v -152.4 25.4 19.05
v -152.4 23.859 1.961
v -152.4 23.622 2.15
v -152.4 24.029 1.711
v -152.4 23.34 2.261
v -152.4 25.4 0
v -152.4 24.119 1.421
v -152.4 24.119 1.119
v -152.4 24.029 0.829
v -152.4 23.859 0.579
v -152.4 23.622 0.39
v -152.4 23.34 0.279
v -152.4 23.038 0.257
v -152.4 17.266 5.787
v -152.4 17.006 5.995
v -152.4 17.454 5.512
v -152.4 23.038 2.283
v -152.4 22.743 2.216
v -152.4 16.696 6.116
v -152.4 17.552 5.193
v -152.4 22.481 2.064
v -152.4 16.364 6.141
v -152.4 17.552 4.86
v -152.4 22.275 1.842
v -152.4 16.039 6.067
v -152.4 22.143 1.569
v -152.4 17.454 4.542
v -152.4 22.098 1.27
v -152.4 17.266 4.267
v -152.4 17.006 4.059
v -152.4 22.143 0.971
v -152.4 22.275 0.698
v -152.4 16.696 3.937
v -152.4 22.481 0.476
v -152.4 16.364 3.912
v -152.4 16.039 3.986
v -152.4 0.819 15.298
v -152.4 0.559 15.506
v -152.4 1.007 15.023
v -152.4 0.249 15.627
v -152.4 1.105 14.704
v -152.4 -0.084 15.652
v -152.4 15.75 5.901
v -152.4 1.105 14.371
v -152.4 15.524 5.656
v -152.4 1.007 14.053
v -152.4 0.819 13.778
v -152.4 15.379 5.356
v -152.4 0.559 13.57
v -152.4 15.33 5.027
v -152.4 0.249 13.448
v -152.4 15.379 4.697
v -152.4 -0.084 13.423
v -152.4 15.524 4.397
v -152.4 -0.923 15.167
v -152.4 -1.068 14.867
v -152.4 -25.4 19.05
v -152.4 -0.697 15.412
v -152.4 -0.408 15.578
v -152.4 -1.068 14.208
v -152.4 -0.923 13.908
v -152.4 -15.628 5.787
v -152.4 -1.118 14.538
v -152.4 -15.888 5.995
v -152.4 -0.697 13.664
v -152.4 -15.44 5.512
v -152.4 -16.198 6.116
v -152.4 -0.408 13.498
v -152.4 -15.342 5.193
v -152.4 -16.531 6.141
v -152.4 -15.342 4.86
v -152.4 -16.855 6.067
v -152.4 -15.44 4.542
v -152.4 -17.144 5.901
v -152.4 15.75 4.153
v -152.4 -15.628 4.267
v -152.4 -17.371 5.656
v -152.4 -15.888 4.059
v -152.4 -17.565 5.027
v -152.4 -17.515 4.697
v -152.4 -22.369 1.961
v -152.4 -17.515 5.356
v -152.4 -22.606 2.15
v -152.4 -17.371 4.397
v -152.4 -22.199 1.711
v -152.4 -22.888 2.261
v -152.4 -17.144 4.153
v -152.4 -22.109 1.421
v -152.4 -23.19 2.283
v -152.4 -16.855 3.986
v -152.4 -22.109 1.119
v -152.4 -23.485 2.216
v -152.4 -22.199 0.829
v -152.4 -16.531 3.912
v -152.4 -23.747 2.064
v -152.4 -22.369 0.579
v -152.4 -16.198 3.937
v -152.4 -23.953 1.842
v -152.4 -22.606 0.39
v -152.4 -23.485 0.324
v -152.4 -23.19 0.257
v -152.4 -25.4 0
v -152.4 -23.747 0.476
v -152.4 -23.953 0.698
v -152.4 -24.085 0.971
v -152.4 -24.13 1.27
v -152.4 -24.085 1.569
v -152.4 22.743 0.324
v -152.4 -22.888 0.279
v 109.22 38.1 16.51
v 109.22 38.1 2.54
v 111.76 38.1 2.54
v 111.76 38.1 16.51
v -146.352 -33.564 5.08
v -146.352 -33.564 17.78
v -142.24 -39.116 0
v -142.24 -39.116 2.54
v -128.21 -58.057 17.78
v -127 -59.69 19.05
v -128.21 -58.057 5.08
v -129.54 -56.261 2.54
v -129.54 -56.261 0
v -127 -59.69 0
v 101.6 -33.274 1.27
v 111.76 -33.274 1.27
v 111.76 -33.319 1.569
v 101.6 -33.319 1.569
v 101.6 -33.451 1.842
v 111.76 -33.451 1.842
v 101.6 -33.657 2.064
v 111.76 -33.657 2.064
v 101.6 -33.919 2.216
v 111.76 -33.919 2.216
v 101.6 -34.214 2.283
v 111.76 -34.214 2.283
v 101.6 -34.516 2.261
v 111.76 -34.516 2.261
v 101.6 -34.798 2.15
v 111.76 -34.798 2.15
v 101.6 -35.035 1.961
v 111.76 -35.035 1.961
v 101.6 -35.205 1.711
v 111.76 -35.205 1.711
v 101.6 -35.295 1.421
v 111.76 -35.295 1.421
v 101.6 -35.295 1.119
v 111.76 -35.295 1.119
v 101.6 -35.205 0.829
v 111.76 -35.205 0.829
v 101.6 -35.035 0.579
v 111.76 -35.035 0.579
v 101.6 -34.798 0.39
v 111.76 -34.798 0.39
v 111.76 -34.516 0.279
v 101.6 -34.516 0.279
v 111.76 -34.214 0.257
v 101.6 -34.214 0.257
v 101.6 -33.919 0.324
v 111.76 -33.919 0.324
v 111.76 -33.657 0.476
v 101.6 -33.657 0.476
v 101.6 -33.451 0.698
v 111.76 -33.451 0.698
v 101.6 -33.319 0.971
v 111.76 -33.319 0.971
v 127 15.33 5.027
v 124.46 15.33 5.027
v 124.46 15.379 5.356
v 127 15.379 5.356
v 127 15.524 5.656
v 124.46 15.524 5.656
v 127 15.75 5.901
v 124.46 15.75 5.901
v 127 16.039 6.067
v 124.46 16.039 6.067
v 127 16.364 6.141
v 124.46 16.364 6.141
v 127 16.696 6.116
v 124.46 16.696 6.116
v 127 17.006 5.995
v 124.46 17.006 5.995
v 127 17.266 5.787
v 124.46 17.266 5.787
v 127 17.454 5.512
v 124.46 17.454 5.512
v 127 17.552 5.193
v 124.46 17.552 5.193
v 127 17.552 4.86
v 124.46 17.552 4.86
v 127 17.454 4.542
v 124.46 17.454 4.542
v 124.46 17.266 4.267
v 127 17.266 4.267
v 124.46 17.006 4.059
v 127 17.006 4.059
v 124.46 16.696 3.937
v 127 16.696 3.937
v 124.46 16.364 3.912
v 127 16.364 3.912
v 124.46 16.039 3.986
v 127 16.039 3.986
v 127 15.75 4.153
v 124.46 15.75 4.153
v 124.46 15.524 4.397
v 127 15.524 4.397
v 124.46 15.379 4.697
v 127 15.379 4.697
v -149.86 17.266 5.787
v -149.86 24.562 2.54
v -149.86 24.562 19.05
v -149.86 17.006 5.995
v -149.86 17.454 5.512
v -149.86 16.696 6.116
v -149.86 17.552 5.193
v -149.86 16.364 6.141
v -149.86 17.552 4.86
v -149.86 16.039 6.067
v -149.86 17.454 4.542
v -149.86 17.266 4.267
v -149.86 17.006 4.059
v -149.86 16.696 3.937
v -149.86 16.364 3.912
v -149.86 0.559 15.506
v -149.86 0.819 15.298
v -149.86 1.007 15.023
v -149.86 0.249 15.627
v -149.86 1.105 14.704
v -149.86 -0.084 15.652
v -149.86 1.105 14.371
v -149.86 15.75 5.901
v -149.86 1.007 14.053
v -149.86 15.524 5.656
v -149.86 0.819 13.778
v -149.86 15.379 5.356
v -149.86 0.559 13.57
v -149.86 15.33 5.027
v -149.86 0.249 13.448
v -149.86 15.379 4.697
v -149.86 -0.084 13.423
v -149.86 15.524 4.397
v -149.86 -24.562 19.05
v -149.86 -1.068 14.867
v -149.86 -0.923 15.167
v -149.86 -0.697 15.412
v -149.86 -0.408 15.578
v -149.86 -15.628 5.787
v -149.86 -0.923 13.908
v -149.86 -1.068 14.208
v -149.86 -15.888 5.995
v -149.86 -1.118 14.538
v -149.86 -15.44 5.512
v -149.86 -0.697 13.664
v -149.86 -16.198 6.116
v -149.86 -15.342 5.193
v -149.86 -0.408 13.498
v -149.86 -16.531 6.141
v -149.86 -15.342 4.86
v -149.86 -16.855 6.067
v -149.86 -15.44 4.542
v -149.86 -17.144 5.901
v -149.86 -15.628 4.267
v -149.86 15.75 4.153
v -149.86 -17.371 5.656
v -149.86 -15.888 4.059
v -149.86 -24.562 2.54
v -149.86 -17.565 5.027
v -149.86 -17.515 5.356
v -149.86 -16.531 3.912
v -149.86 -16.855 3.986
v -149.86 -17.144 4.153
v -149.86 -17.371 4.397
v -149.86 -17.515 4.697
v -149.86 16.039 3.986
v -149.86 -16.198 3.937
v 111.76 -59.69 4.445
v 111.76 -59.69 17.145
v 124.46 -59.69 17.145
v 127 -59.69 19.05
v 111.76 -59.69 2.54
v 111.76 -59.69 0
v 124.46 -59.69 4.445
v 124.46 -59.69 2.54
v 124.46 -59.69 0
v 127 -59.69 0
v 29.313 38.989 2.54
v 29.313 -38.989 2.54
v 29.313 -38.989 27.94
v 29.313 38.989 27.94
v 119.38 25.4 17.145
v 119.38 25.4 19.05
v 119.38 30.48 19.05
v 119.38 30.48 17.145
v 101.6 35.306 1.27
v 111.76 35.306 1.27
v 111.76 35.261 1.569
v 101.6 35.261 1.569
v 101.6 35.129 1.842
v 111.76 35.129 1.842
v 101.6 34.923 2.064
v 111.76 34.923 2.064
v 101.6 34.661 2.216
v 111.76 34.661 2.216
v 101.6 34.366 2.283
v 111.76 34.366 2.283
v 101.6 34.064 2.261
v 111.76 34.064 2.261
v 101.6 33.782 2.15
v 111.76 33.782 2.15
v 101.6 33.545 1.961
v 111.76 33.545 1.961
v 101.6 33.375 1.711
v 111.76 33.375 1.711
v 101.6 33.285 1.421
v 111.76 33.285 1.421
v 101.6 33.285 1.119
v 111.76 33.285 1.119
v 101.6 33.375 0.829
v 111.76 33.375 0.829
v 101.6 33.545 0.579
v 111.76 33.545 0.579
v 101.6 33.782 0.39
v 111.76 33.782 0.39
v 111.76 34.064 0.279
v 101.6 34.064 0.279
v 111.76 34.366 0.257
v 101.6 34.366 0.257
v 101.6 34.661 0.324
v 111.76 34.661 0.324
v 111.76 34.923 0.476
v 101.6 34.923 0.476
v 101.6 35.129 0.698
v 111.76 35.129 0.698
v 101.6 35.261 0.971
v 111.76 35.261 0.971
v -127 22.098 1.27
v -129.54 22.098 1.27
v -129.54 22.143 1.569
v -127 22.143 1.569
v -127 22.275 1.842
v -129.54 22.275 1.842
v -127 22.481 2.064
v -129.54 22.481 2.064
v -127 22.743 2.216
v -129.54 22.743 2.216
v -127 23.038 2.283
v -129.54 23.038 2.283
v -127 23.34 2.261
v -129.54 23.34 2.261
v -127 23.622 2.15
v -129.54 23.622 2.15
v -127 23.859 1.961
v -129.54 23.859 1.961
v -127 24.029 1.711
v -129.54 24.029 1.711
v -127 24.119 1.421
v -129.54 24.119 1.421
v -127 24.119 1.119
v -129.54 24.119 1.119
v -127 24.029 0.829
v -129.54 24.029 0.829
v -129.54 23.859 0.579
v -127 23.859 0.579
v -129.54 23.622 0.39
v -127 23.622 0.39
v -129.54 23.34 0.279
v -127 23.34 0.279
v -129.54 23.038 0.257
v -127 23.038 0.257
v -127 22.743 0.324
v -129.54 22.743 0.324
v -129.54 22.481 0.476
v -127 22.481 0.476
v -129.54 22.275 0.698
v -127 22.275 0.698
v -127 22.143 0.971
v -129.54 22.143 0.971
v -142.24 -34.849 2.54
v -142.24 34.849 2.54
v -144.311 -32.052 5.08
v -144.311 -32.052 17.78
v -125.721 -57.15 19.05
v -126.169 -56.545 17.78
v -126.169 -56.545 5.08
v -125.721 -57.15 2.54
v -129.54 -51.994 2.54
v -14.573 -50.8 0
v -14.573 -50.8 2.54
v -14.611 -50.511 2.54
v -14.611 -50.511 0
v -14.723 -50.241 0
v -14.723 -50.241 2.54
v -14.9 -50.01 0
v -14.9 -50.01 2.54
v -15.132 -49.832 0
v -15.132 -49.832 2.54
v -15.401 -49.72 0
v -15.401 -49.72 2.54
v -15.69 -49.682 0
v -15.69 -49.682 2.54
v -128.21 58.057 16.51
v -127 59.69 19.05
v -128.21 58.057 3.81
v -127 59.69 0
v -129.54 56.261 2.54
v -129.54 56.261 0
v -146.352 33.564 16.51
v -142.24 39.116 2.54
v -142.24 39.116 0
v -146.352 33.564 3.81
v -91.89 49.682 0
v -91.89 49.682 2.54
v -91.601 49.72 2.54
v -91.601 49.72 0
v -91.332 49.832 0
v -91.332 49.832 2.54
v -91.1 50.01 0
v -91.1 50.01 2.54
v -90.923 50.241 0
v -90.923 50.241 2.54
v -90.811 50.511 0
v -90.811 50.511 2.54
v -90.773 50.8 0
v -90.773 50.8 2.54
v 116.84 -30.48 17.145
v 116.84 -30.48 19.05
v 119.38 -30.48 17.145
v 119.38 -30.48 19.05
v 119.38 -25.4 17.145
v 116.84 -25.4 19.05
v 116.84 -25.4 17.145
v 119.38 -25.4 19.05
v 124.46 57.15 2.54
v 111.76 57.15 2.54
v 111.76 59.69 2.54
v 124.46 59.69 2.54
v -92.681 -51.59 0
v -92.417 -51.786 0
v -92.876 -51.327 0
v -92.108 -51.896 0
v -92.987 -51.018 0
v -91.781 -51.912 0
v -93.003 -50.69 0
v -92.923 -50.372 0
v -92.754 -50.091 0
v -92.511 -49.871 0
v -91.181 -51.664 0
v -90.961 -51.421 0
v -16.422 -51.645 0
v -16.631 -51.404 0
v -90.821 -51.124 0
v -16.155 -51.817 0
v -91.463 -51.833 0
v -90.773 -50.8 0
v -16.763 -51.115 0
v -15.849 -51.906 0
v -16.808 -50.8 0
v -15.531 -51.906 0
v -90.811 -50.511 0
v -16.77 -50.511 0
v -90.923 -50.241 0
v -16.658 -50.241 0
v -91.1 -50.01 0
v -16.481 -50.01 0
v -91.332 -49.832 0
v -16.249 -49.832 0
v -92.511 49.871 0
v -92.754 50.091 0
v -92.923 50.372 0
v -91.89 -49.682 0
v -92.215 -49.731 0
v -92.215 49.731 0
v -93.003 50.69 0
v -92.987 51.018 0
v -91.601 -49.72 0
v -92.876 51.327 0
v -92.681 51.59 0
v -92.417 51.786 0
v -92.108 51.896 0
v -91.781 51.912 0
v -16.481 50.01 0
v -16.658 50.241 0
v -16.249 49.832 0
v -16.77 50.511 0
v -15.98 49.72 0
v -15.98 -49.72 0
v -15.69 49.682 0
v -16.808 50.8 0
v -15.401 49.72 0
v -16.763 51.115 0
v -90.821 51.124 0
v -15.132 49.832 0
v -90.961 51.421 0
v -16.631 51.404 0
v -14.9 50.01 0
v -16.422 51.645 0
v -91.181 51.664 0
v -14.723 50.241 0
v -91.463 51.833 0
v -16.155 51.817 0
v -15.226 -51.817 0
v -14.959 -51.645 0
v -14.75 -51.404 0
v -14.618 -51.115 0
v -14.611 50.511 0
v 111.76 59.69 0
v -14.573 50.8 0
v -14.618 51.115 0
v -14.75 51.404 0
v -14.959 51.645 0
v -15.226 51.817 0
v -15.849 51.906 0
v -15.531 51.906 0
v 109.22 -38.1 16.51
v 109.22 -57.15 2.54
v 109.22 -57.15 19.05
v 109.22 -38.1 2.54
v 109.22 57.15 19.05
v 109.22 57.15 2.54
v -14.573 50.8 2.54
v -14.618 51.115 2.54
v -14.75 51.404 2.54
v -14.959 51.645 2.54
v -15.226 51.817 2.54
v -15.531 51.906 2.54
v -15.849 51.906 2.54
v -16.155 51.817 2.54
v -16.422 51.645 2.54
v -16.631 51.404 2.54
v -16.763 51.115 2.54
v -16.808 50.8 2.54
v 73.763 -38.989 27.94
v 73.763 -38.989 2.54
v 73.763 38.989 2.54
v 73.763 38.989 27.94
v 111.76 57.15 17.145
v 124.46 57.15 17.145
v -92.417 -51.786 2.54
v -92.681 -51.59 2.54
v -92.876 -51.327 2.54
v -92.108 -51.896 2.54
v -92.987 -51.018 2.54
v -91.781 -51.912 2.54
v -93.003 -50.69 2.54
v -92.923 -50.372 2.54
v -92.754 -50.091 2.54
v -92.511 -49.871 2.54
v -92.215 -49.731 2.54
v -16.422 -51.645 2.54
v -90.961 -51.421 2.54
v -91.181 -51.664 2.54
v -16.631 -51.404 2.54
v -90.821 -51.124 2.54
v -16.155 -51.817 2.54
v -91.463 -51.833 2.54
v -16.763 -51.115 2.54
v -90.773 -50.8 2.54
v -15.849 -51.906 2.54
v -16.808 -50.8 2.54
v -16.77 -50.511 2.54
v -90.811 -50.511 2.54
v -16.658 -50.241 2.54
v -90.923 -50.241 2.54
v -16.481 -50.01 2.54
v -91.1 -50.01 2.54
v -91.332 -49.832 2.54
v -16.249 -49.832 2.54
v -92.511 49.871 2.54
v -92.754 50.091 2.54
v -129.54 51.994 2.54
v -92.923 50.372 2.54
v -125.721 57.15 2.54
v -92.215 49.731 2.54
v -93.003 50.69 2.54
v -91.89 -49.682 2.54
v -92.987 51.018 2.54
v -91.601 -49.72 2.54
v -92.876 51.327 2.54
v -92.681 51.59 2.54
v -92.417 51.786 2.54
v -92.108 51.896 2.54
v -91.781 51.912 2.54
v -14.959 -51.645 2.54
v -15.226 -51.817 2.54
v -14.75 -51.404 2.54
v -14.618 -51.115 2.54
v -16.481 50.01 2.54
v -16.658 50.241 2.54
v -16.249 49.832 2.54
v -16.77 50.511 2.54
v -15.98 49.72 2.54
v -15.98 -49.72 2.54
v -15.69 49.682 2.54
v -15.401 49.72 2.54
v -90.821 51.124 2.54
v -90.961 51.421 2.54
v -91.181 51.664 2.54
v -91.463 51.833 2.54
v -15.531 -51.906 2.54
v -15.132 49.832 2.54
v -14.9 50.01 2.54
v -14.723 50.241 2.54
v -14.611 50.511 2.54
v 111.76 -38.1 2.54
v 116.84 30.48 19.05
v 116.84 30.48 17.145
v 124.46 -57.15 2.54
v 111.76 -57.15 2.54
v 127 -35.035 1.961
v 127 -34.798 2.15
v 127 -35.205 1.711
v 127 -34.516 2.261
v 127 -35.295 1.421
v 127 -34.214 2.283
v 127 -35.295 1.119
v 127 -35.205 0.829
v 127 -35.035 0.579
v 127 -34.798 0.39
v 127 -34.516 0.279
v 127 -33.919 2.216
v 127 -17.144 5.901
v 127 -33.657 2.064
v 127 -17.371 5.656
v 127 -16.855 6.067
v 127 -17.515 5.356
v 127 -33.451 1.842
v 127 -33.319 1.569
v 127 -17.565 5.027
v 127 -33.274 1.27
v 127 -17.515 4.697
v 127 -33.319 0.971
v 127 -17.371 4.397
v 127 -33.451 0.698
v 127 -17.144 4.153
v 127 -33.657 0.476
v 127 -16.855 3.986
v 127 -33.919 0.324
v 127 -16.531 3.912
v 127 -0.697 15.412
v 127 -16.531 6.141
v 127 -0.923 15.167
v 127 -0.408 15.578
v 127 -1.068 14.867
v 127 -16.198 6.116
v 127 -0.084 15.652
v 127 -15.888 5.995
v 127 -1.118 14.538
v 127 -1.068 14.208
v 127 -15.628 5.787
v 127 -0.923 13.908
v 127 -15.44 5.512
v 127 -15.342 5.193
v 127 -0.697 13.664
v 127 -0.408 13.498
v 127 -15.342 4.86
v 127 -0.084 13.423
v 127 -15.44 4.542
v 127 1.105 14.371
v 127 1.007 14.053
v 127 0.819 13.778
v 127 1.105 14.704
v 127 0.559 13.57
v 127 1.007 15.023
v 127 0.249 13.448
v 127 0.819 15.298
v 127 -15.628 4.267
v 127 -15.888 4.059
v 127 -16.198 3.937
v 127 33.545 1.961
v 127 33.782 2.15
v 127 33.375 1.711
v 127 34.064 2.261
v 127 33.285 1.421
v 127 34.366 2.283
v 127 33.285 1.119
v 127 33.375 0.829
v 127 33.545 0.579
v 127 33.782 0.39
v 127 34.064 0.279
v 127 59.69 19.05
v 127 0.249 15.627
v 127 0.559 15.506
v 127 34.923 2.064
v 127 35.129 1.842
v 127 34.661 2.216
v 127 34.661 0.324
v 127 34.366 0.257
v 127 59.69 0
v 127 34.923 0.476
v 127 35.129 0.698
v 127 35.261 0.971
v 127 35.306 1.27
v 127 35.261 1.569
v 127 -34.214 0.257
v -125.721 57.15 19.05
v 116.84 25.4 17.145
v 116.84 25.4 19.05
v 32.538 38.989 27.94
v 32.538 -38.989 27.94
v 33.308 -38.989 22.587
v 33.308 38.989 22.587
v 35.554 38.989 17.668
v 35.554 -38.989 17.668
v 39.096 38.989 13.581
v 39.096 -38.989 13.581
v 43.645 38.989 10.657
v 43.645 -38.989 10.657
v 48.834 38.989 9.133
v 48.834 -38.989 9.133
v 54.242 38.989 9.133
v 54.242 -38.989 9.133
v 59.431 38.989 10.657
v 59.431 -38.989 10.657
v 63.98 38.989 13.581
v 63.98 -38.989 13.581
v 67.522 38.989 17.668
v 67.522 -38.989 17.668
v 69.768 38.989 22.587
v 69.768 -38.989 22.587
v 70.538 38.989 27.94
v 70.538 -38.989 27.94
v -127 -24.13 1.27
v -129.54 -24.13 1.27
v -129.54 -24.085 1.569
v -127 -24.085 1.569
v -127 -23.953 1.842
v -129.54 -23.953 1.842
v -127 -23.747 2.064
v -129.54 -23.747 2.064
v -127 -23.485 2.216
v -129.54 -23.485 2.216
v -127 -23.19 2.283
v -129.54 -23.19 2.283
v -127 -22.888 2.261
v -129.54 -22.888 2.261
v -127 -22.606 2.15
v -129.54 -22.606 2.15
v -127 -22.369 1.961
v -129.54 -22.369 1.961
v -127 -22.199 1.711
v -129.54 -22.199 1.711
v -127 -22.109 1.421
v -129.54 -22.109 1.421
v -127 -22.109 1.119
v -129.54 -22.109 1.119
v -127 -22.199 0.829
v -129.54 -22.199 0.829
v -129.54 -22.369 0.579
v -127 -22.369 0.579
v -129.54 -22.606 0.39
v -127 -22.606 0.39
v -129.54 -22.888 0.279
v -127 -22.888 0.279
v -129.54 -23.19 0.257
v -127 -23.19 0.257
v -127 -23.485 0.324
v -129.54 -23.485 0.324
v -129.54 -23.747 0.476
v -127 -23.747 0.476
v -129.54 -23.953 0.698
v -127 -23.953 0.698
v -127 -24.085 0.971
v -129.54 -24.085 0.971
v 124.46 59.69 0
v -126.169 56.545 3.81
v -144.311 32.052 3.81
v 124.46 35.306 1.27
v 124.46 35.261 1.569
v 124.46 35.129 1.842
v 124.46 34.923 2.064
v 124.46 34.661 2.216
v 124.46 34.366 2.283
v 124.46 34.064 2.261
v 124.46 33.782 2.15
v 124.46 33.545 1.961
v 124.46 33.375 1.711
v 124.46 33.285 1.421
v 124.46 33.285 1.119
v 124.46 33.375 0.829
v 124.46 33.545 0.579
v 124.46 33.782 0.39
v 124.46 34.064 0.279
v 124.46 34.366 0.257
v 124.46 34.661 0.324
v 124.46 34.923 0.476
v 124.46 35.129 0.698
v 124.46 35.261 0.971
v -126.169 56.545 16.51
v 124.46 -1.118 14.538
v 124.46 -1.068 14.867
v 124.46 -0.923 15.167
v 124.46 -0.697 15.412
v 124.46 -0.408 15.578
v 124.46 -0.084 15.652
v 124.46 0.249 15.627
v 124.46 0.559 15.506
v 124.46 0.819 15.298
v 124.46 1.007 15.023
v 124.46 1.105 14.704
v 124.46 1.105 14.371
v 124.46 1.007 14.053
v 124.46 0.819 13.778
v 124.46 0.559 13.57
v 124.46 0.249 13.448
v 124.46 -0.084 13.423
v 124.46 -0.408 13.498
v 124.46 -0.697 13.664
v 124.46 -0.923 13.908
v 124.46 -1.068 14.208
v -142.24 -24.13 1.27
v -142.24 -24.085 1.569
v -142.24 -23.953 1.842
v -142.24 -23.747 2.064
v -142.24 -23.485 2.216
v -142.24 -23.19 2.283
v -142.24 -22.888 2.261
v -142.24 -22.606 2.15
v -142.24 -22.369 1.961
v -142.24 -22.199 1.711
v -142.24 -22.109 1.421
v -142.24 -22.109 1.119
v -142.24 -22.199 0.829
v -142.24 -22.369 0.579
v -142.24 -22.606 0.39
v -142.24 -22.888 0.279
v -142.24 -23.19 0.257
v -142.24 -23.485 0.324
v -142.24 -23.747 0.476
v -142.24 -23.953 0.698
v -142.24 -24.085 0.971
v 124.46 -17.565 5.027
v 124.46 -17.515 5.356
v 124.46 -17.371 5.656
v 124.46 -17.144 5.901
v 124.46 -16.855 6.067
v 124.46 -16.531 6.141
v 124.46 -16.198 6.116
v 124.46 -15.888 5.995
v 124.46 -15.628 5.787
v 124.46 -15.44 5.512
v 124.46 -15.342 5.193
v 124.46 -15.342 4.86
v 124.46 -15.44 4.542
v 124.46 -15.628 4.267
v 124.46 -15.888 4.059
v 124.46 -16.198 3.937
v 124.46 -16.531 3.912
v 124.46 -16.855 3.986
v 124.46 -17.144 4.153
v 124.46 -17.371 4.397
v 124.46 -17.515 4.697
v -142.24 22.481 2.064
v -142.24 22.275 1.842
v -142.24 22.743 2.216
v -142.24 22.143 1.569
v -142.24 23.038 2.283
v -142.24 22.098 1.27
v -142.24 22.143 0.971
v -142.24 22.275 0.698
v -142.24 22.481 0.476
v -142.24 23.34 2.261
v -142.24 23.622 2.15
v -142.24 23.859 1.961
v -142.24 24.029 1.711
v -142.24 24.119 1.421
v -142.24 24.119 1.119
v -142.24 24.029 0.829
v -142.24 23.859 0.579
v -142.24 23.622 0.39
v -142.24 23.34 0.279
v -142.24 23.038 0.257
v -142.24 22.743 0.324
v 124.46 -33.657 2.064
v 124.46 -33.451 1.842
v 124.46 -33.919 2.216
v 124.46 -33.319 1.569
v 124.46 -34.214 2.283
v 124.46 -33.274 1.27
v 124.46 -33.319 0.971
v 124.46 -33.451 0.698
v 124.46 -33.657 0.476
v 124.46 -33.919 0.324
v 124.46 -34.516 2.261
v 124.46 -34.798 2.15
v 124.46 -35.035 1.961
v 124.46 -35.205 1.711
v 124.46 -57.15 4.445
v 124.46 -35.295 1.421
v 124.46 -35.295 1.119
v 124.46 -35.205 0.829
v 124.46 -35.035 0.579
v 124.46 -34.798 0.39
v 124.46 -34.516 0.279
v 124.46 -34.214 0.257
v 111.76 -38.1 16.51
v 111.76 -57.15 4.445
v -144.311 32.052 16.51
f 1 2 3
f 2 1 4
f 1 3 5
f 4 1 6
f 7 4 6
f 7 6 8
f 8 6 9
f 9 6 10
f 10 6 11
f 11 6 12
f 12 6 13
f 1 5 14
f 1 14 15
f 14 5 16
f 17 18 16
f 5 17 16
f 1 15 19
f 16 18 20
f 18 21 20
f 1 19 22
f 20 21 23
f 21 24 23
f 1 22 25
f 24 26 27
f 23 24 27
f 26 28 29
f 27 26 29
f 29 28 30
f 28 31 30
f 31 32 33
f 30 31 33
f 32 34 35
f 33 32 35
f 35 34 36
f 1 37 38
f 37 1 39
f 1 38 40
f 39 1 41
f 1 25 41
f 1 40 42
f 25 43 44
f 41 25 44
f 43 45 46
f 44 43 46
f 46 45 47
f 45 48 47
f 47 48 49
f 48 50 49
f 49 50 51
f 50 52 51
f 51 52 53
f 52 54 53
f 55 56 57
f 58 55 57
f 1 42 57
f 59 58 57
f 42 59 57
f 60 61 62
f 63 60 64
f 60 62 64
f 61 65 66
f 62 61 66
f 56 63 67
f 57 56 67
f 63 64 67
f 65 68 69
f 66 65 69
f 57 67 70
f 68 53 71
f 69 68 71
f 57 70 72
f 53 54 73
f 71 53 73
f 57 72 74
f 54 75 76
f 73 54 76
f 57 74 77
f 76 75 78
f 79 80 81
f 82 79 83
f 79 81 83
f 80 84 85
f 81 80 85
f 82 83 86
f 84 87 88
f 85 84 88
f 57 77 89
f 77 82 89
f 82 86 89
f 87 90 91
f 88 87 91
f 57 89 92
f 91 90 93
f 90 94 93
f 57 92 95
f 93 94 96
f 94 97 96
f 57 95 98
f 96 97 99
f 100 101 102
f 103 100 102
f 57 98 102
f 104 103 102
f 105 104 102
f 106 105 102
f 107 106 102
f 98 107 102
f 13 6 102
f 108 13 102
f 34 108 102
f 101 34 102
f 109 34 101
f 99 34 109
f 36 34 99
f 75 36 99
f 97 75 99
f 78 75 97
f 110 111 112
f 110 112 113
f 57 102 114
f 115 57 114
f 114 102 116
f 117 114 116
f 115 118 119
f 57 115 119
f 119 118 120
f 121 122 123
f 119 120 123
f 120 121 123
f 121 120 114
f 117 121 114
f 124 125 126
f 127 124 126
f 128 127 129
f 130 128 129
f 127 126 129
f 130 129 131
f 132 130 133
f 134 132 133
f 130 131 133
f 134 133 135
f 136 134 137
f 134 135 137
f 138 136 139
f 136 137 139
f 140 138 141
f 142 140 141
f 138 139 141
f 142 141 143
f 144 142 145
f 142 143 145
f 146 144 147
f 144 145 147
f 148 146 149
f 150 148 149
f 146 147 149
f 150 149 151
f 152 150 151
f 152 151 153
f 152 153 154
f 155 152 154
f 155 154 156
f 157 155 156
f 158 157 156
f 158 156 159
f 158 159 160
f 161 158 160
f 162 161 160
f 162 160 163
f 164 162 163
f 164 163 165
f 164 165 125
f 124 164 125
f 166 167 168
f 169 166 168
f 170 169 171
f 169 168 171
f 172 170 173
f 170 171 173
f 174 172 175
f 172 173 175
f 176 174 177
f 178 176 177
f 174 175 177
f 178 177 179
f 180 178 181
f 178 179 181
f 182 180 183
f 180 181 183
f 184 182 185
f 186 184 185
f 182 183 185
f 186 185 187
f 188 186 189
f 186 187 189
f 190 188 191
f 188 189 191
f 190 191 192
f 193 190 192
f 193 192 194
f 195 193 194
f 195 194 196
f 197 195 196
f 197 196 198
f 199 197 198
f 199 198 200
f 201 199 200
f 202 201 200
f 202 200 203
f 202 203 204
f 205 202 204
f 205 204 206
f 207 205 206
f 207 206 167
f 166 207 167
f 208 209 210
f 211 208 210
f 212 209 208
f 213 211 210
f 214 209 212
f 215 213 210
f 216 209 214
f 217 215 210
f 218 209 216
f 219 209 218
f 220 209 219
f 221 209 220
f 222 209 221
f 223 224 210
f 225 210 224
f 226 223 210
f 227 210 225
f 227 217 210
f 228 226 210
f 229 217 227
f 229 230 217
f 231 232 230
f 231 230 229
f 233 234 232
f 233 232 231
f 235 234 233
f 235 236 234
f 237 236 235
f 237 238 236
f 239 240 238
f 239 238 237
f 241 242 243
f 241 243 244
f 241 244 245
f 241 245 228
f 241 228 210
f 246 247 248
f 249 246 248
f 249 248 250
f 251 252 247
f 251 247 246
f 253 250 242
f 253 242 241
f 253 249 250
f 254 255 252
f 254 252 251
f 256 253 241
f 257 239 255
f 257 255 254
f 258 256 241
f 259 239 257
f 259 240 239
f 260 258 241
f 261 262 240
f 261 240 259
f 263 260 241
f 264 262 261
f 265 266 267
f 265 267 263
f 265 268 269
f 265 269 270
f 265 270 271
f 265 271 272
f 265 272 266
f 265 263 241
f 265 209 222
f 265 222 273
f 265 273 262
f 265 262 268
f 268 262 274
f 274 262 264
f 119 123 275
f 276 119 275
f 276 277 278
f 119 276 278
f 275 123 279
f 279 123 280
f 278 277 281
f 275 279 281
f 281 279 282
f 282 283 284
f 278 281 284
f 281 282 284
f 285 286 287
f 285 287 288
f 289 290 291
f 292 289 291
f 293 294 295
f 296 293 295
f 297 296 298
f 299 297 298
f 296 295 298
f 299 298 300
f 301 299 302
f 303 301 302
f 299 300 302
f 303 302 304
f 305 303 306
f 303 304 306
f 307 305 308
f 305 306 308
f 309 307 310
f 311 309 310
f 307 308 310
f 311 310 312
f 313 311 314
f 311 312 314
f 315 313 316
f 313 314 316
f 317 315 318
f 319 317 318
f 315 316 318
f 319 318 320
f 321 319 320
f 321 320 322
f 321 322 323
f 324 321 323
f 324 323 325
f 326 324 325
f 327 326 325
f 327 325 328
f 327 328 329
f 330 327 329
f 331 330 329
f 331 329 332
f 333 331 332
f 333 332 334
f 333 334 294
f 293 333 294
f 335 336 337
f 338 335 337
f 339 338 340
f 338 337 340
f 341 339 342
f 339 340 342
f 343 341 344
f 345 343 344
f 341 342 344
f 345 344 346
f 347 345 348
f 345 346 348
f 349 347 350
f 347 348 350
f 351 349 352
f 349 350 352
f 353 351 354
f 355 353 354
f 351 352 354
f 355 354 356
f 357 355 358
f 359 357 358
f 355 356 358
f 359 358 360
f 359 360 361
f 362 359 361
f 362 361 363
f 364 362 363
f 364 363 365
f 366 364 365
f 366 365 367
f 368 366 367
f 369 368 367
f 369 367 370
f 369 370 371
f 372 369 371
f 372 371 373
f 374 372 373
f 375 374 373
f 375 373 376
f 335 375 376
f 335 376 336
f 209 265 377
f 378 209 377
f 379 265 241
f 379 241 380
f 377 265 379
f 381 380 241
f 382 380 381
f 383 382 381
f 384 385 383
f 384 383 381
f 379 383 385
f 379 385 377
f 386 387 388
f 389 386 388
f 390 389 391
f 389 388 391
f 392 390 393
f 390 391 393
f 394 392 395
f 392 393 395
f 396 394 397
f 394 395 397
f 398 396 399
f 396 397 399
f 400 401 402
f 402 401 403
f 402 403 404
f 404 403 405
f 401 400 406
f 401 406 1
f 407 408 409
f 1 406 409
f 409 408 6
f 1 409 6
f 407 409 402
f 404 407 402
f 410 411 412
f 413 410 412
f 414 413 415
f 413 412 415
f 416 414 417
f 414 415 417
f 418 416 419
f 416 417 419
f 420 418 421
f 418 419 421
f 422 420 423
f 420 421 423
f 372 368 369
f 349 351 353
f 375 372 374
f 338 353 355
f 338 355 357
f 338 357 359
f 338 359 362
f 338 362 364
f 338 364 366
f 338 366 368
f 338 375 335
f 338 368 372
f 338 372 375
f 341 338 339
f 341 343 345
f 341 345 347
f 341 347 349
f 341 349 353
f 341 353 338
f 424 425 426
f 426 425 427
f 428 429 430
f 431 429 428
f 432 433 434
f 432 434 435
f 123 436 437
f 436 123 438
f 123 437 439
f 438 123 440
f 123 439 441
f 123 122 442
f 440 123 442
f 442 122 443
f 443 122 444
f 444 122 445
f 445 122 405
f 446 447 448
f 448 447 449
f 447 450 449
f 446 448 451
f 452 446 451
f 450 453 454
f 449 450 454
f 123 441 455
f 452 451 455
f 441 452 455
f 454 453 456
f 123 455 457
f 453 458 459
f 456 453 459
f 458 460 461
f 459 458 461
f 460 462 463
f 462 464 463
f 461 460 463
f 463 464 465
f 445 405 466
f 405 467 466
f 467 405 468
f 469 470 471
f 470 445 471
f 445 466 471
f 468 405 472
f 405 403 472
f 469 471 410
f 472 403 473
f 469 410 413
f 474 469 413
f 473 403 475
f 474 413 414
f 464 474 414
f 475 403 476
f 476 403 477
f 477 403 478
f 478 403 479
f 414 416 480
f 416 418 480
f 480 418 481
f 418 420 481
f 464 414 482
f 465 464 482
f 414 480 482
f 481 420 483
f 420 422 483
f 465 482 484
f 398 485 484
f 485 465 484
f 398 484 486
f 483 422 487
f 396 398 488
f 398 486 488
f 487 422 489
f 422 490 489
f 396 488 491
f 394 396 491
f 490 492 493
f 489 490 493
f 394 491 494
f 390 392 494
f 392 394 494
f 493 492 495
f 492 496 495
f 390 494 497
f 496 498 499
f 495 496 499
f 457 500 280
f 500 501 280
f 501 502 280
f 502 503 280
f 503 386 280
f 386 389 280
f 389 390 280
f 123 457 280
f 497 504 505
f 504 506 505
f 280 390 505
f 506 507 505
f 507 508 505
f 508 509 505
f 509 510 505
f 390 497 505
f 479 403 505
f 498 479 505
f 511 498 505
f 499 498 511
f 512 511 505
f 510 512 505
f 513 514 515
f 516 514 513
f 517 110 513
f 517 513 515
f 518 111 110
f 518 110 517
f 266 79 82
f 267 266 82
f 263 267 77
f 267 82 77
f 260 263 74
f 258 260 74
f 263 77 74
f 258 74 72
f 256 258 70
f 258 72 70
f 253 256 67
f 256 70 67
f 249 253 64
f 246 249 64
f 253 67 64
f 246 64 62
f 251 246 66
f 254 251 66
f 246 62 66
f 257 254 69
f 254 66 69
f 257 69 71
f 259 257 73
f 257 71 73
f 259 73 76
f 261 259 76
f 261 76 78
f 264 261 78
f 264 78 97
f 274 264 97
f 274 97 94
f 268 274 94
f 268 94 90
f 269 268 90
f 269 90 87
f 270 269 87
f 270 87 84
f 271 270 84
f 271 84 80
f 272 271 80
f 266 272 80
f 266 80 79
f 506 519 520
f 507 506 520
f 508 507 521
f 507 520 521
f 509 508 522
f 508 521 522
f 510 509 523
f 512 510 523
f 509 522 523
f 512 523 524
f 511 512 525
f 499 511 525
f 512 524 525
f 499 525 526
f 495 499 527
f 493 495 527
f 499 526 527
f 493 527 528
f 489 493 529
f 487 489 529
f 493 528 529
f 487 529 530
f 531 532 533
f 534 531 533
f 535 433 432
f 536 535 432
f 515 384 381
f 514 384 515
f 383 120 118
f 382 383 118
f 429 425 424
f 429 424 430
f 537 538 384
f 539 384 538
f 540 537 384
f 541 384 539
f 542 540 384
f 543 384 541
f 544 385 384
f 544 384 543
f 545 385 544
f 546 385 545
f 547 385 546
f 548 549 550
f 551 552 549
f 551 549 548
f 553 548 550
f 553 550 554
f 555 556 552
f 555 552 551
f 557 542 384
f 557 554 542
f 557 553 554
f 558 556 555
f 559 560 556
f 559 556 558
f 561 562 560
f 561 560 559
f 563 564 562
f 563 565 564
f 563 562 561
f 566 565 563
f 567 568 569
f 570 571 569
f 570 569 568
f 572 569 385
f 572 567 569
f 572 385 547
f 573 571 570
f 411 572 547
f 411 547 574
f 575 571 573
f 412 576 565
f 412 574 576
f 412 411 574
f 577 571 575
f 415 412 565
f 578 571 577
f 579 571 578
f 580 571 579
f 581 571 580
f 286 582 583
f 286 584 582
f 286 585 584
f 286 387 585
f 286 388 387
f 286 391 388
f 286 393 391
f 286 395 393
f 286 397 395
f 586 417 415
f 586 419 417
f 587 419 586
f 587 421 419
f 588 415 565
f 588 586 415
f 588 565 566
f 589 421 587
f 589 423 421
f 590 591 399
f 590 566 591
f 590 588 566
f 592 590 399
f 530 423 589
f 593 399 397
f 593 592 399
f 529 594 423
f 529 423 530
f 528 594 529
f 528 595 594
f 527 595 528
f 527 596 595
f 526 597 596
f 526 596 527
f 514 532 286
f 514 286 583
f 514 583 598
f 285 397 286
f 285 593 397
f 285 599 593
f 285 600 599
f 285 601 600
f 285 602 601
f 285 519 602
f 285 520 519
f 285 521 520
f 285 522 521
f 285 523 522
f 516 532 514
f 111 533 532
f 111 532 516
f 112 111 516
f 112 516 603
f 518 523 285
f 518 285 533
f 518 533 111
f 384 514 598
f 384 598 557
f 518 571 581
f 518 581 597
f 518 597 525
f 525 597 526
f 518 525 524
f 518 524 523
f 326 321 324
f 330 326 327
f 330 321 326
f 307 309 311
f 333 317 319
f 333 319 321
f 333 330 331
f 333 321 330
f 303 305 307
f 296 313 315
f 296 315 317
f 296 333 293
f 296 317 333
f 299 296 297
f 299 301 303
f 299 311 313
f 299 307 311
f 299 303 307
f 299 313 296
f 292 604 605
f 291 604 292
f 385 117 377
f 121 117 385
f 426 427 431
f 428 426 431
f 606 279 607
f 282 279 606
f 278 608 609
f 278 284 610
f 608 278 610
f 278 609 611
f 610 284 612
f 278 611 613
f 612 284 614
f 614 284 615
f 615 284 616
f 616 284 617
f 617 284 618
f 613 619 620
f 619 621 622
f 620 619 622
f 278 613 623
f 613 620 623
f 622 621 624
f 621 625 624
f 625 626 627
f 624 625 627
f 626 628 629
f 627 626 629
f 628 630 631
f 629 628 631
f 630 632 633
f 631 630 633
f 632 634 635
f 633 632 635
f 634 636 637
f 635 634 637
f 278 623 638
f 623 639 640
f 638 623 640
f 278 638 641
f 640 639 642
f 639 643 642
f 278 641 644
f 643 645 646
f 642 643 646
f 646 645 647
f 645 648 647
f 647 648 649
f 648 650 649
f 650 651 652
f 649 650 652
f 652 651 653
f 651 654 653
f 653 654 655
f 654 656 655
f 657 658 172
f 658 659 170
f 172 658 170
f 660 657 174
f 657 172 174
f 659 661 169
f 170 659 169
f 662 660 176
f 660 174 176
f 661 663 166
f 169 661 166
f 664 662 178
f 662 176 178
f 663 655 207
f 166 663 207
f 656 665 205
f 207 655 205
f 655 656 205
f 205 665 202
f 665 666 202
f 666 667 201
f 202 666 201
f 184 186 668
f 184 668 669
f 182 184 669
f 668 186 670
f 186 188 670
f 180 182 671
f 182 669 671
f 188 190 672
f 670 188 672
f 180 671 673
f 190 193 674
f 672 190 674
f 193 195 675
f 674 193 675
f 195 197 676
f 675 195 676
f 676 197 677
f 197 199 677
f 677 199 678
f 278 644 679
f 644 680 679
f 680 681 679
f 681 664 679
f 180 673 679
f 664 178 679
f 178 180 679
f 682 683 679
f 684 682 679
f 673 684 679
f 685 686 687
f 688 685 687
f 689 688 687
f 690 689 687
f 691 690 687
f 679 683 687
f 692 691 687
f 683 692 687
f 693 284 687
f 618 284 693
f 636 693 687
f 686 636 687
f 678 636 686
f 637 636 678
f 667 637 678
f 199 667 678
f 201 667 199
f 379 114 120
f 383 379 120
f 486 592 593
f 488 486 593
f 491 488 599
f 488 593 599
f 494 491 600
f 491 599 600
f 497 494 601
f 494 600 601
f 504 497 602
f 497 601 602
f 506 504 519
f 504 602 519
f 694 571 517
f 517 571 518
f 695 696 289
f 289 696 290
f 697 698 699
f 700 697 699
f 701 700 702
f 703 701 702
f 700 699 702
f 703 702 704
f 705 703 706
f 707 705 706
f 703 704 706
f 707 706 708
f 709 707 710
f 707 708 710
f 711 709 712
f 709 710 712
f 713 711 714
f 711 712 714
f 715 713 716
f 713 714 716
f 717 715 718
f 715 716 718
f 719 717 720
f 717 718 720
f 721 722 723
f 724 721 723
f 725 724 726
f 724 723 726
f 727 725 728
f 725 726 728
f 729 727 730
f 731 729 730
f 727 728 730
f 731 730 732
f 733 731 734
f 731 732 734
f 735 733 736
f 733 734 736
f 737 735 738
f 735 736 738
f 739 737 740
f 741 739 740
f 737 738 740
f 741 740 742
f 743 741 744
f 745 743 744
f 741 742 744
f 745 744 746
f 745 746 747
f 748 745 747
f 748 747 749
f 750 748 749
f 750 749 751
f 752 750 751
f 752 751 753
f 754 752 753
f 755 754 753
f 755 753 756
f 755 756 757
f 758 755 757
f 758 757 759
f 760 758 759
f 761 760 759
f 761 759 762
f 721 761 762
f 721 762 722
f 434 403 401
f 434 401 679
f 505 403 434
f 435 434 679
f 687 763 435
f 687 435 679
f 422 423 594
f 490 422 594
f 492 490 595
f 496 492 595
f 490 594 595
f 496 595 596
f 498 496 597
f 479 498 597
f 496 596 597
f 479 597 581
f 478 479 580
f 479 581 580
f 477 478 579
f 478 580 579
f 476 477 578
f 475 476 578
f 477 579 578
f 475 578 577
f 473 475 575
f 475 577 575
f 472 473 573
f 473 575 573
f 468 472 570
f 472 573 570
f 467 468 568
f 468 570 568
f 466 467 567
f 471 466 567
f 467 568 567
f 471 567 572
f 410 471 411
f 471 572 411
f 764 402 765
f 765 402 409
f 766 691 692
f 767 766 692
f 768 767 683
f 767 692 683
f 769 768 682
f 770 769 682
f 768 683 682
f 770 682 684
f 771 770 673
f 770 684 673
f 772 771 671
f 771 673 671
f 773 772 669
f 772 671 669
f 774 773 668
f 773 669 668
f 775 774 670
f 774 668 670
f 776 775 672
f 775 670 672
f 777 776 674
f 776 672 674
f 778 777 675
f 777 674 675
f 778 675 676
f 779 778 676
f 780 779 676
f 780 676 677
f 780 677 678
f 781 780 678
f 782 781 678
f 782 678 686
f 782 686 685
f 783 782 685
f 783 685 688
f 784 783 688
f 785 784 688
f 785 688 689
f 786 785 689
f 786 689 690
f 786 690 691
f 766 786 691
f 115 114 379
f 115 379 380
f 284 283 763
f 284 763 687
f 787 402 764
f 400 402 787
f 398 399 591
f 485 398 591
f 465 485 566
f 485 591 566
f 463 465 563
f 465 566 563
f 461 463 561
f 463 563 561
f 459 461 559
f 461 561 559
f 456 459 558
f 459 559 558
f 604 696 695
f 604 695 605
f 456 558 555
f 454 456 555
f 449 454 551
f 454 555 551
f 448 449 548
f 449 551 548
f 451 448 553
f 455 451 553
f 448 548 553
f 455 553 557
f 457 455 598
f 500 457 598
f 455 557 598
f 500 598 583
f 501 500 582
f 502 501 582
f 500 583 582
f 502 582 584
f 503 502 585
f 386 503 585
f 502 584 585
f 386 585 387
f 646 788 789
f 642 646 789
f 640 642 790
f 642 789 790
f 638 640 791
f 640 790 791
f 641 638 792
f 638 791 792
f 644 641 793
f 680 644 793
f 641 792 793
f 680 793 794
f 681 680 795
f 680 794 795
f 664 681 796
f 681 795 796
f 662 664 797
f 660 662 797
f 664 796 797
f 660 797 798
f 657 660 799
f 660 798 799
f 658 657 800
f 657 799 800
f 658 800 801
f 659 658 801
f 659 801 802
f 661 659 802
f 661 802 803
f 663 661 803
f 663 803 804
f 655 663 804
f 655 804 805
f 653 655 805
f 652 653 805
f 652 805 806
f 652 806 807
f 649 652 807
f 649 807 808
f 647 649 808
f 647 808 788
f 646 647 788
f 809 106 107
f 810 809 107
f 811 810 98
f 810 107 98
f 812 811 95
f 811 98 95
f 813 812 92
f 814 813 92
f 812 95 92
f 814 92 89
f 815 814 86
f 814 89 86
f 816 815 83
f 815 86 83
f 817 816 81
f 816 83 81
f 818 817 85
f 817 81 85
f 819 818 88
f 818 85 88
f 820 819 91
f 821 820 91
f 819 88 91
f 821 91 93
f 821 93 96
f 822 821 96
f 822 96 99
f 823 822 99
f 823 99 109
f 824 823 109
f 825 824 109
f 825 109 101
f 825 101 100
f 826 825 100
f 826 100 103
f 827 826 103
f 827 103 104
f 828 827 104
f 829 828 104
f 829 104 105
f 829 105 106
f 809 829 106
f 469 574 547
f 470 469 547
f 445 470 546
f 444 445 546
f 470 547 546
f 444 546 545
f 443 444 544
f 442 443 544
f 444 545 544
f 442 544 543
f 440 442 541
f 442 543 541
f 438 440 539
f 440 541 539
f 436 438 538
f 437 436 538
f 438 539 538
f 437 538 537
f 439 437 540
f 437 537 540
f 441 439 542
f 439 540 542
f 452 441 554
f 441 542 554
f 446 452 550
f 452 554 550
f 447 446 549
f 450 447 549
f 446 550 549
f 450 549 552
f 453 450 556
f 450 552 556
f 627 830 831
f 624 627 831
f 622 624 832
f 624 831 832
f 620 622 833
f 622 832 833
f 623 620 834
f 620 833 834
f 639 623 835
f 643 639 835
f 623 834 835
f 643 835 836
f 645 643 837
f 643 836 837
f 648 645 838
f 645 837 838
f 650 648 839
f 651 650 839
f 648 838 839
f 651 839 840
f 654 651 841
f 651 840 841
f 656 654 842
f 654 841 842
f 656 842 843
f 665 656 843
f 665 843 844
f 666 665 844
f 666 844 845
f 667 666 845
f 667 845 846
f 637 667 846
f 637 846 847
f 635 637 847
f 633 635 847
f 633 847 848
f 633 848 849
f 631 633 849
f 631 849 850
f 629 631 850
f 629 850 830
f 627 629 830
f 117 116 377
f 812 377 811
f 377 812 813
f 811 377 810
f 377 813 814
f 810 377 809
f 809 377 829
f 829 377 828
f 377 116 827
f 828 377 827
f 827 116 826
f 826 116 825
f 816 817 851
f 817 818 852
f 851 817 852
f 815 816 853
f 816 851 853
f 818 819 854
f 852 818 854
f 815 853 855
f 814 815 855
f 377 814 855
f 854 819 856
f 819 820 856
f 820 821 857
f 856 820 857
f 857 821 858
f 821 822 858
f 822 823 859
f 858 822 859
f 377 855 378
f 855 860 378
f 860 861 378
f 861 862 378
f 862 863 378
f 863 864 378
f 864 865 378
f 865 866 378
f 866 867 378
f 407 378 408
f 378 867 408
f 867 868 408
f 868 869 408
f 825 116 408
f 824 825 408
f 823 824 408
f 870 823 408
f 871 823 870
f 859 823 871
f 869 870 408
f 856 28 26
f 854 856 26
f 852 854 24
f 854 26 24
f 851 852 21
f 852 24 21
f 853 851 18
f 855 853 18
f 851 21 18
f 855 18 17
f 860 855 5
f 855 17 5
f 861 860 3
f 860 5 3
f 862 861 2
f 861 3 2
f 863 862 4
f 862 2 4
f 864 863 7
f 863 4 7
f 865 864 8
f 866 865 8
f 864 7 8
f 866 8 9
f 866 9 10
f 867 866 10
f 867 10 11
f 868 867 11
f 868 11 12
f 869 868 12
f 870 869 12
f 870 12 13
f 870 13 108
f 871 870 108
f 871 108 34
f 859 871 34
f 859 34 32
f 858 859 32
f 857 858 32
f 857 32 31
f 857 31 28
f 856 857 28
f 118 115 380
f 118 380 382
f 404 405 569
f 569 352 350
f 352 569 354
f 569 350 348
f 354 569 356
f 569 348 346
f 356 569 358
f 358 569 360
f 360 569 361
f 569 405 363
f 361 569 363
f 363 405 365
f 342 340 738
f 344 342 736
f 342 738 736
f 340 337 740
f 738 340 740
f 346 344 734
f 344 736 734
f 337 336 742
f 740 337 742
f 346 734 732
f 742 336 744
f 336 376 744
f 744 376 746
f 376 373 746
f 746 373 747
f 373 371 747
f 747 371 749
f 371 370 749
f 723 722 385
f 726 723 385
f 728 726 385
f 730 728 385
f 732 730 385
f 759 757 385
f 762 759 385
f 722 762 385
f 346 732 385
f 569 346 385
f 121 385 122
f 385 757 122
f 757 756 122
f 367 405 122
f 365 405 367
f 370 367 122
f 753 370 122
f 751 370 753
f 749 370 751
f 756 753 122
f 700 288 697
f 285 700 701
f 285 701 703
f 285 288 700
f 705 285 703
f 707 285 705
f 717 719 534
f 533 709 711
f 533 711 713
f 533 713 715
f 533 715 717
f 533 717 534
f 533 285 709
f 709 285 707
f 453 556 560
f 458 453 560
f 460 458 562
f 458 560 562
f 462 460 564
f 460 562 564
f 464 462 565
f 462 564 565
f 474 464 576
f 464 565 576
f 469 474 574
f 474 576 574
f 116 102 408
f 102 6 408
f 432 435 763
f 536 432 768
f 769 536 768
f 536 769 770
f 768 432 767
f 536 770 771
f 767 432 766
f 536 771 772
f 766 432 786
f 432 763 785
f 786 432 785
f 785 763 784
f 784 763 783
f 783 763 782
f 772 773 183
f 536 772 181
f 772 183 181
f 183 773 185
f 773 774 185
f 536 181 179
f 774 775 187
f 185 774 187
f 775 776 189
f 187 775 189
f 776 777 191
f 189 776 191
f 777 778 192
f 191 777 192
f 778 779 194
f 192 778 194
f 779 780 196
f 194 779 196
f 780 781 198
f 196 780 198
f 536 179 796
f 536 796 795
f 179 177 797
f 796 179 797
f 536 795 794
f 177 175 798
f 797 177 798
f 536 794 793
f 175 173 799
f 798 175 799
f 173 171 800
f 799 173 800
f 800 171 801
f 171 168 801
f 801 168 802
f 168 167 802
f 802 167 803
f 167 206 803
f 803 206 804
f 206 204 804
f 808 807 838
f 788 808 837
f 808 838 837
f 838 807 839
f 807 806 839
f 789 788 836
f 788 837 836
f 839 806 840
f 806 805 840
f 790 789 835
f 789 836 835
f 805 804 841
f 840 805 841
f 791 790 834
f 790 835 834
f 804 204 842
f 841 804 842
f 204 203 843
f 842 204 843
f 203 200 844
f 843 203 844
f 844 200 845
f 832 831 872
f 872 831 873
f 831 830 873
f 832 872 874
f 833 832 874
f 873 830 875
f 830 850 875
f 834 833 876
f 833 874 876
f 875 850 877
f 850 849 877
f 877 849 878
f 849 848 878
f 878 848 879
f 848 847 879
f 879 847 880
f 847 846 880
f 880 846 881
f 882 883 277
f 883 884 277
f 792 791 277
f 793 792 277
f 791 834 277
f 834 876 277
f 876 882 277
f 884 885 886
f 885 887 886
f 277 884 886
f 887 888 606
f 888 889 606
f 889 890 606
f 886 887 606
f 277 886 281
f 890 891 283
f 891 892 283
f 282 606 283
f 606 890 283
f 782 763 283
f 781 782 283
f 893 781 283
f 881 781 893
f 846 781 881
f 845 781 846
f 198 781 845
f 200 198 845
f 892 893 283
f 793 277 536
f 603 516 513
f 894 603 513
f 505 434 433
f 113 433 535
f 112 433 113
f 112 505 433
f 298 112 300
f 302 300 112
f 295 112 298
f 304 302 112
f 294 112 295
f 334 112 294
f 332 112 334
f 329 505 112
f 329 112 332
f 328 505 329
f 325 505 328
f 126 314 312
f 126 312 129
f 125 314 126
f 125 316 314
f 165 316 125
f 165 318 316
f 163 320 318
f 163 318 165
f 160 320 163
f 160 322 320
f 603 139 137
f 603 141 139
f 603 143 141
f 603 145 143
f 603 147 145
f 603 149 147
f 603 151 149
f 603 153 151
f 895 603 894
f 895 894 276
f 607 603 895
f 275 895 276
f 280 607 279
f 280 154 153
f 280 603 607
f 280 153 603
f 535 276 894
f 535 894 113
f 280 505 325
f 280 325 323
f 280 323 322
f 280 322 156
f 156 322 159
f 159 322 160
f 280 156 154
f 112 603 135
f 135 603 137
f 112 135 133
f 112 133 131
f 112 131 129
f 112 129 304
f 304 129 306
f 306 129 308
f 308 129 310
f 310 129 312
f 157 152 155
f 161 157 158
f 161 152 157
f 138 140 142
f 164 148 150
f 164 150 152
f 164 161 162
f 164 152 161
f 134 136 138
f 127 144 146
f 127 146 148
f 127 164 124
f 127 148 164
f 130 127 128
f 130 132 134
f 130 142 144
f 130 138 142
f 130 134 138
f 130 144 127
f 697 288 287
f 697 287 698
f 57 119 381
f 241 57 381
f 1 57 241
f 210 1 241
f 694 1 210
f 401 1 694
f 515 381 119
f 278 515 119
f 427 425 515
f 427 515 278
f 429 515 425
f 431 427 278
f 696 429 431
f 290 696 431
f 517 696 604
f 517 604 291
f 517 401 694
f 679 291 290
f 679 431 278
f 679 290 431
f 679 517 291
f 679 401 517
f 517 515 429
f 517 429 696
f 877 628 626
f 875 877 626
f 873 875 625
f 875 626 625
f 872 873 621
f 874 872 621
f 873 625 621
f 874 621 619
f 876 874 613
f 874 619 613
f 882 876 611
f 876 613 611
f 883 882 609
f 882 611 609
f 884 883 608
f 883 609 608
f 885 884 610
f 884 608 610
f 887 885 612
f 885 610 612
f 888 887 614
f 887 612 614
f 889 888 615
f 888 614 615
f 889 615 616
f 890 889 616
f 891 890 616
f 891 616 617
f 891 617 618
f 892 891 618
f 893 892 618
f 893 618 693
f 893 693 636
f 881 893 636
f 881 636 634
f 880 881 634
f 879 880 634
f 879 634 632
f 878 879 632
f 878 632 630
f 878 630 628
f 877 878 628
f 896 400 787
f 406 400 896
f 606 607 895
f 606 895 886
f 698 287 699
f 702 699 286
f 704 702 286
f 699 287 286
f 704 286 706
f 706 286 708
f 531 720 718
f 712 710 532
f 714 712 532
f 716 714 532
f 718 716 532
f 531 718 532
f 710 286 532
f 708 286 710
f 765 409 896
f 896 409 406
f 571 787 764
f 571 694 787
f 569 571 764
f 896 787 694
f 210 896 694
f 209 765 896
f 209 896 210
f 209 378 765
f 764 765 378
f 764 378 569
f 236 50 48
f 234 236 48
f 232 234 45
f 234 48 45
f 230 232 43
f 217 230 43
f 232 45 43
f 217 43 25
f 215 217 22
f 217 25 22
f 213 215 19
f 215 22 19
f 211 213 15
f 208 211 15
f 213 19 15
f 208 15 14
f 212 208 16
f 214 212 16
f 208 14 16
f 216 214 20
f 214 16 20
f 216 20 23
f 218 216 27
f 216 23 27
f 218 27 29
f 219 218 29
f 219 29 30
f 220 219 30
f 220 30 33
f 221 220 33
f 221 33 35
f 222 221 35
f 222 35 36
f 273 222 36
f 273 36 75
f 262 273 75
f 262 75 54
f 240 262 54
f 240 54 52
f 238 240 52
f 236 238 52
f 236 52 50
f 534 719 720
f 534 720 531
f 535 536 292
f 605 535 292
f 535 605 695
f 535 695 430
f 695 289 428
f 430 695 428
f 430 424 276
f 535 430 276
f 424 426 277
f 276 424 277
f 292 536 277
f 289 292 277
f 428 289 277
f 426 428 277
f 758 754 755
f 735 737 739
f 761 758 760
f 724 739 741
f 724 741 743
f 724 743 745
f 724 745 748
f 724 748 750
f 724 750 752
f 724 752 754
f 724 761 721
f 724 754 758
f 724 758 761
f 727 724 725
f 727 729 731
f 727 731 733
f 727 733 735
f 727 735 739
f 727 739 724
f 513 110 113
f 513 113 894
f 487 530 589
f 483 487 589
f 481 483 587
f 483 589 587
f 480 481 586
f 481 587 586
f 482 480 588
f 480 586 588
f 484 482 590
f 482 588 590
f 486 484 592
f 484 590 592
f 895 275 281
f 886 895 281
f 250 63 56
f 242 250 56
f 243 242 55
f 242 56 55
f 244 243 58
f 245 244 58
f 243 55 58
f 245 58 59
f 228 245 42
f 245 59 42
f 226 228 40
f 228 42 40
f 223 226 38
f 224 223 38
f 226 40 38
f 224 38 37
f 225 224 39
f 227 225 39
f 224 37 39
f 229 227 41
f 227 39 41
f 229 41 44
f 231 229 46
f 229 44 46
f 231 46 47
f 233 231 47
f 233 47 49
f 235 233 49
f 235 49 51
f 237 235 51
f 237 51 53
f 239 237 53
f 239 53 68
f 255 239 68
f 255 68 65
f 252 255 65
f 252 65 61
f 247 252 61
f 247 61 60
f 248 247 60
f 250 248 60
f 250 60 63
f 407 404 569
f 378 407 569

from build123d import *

# Parameters (mm, degrees)
F0_W      = 254
F0_H      = 119.38
F1_DEPTH  = 19.05
F2_T      = -2.54
F3_W      = 30.48
F3_H      = 12.7
F4_DEPTH  = 2.54
F5_W      = 12.7
F5_H      = 119.38
F6_DEPTH  = 2.54
F7_R      = 1.016
F8_DEPTH  = 25.4
F9_R      = 1.016
F10_DEPTH = 25.4
F11_W     = 30.48
F11_H     = 12.7
F12_DEPTH = 2.54
F13_W     = 12.7
F13_H     = 12.7
F14_DEPTH = 101.6
F15_R     = 1.1176
F16_DEPTH = 84.582
F17_R     = 1.1176
F18_DEPTH = 279.4
F20_DEPTH = 2.54
F21_W     = 44.45
F21_H     = 77.978
F22_DEPTH = 25.4
F23_R     = 19
F24_DEPTH = 77.978
F25_W     = 114.3
F25_H     = 1.905
F26_DEPTH = 12.7
F27_W     = 2.54
F27_H     = 114.3
F28_DEPTH = 16.51
F29_W     = 2.54
F29_H     = 5.08
F30_DEPTH = 25.4
F31_W     = 76.2
F31_H     = 13.97
F32_DEPTH = 5.08


with BuildPart() as f1:
    # F0 (on Top) → F1 (new body)
    with BuildSketch(Plane.XY):
        Rectangle(F0_W, F0_H)
        Polygon((-152.4, -25.4), (-127, -59.69), (-127, 59.69), (-152.4, 25.4), align=None)
    extrude(amount=F1_DEPTH)

    # F2
    f2_openings = [f1.faces().sort_by_distance(p)[0] for p in [
        (-9.181331, 0, 19.05),
    ]]
    offset(amount=F2_T, openings=f2_openings)

    # F3 (on face) → F4 (cut)
    with BuildSketch(Plane(origin=(-110.5541186891, -81.8919397697, 0), x_dir=(0.5952275506, -0.8035571933, 0), z_dir=(-0.8035571933, -0.5952275506, 0))):
        with Locations((-44.9023260044, 11.43)):
            Rectangle(F3_W, F3_H)
    extrude(amount=-F4_DEPTH, mode=Mode.SUBTRACT)

    # F5 (on face) → F6 (cut)
    with BuildSketch(Plane(origin=(0, 0, 0), x_dir=(1, 0, 0), z_dir=(0, 0, -1))):
        Polygon((-129.54, -56.261), (-129.54, 56.261), (-142.24, 39.116), (-142.24, -39.116), align=None)
        with Locations((118.11, 0)):
            Rectangle(F5_W, F5_H)
    extrude(amount=-F6_DEPTH, mode=Mode.SUBTRACT)

    # F7 (on face) → F8 (cut)
    with BuildSketch(Plane(origin=(-152.4, 0, 0), x_dir=(0, -1, 0), z_dir=(-1, 0, 0))):
        with Locations((-23.114, 1.27)):
            Circle(F7_R)
        with Locations((23.114, 1.27)):
            Circle(F7_R)
    extrude(amount=-F8_DEPTH, mode=Mode.SUBTRACT)

    # F9 (on face) → F10 (cut)
    with BuildSketch(Plane.YZ.offset(127)):
        with Locations((-34.29, 1.27)):
            Circle(F9_R)
        with Locations((34.29, 1.27)):
            Circle(F9_R)
    extrude(amount=-F10_DEPTH, mode=Mode.SUBTRACT)

    # F11 (on face) → F12 (cut)
    with BuildSketch(Plane(origin=(-110.5541186891, 81.8919397697, 0), x_dir=(-0.5952275506, -0.8035571933, 0), z_dir=(-0.8035571933, 0.5952275506, 0))):
        with Locations((44.9023260044, 10.16)):
            Rectangle(F11_W, F11_H)
    extrude(amount=-F12_DEPTH, mode=Mode.SUBTRACT)

    # F13 (on face) → F14 (cut)
    with BuildSketch(Plane.XZ.offset(59.69)):
        with Locations((118.11, 10.795)):
            Rectangle(F13_W, F13_H)
    extrude(amount=-F14_DEPTH, mode=Mode.SUBTRACT)

    # F15 (on Right) → F16 (cut, symmetric)
    with BuildSketch(Plane.YZ):
        with Locations((0, 11.811)):
            Circle(F15_R)
        with Locations((-17.78, 5.08)):
            Circle(F15_R)
        with Locations((17.78, 5.08)):
            Circle(F15_R)
    extrude(amount=F16_DEPTH, both=True, mode=Mode.SUBTRACT)

    # F17 (on face) → F18 (cut)
    with BuildSketch(Plane(origin=(-152.4, 0, 0), x_dir=(0, -1, 0), z_dir=(-1, 0, 0))):
        with Locations((-16.4471499023, 5.0268133191)):
            Circle(F17_R)
        with Locations((16.4471499023, 5.0268133191)):
            Circle(F17_R)
        with Locations((0, 14.5379047776)):
            Circle(F17_R)
    extrude(amount=-F18_DEPTH, mode=Mode.SUBTRACT)

    # F19 (on face) → F20 (cut)
    with BuildSketch(Plane.XY.offset(2.54)):
        with BuildLine():
            Line((-91.8904091179, -50.8), (-90.7728091179, -50.8))
            ThreePointArc((-90.7728091179, -50.8), (-91.1001465793, -50.0097374613), (-91.8904091179, -49.6824))
            Line((-91.8904091179, -49.6824), (-91.8904091179, -50.8))
        make_face()
        with BuildLine():
            ThreePointArc((-91.8904091179, -49.6824), (-92.6806716566, -51.5902625387), (-90.7728091179, -50.8))
            Line((-90.7728091179, -50.8), (-91.8904091179, -50.8))
            Line((-91.8904091179, -50.8), (-91.8904091179, -49.6824))
        make_face()
        with BuildLine():
            Line((-15.6904091179, -50.8), (-16.8080091179, -50.8))
            ThreePointArc((-16.8080091179, -50.8), (-15.6904091179, -51.9176), (-14.5728091179, -50.8))
            ThreePointArc((-14.5728091179, -50.8), (-14.9001465793, -50.0097374613), (-15.6904091179, -49.6824))
            Line((-15.6904091179, -49.6824), (-15.6904091179, -50.8))
        make_face()
        with BuildLine():
            ThreePointArc((-15.6904091179, -49.6824), (-16.4806716566, -50.0097374613), (-16.8080091179, -50.8))
            Line((-16.8080091179, -50.8), (-15.6904091179, -50.8))
            Line((-15.6904091179, -50.8), (-15.6904091179, -49.6824))
        make_face()
        with BuildLine():
            Line((-15.6904091179, 50.8), (-15.6904091179, 49.6824))
            ThreePointArc((-15.6904091179, 49.6824), (-14.9001465793, 50.0097374613), (-14.5728091179, 50.8))
            ThreePointArc((-14.5728091179, 50.8), (-15.6904091179, 51.9176), (-16.8080091179, 50.8))
            Line((-16.8080091179, 50.8), (-15.6904091179, 50.8))
        make_face()
        with BuildLine():
            ThreePointArc((-16.8080091179, 50.8), (-16.4806716566, 50.0097374613), (-15.6904091179, 49.6824))
            Line((-15.6904091179, 49.6824), (-15.6904091179, 50.8))
            Line((-15.6904091179, 50.8), (-16.8080091179, 50.8))
        make_face()
        with BuildLine():
            ThreePointArc((-90.7728091179, 50.8), (-92.6806716566, 51.5902625387), (-91.8904091179, 49.6824))
            Line((-91.8904091179, 49.6824), (-91.8904091179, 50.8))
            Line((-91.8904091179, 50.8), (-90.7728091179, 50.8))
        make_face()
        with BuildLine():
            Line((-91.8904091179, 50.8), (-91.8904091179, 49.6824))
            ThreePointArc((-91.8904091179, 49.6824), (-91.1001465793, 50.0097374613), (-90.7728091179, 50.8))
            Line((-90.7728091179, 50.8), (-91.8904091179, 50.8))
        make_face()
    extrude(amount=-F20_DEPTH, mode=Mode.SUBTRACT)

    # F21 (on face) → F22 (join)
    with BuildSketch(Plane.XY.offset(2.54)):
        with Locations((51.5379719436, 0)):
            Rectangle(F21_W, F21_H)
    extrude(amount=F22_DEPTH)

    # F23 (on face) → F24 (cut)
    with BuildSketch(Plane.XZ.offset(38.989)):
        with Locations((51.5379719436, 27.94)):
            Circle(F23_R)
    extrude(amount=-F24_DEPTH, mode=Mode.SUBTRACT)

    # F25 (on face) → F26 (join)
    with BuildSketch(Plane(origin=(124.46, 0, 0), x_dir=(0, -1, 0), z_dir=(-1, 0, 0))):
        with Locations((0, 18.0975)):
            Rectangle(F25_W, F25_H)
    extrude(amount=F26_DEPTH)

    # F27 (on face) → F28 (join)
    with BuildSketch(Plane.XY.offset(2.54)):
        with Locations((110.49, 0)):
            Rectangle(F27_W, F27_H)
    extrude(amount=F28_DEPTH)

    # F29 (on face) → F30 (cut)
    with BuildSketch(Plane.XY.offset(19.05)):
        with Locations((118.11, 27.94)):
            Rectangle(F29_W, F29_H)
        with Locations((118.11, -27.94)):
            Rectangle(F29_W, F29_H)
    extrude(amount=-F30_DEPTH, mode=Mode.SUBTRACT)

    # F31 (on face) → F32 (cut)
    with BuildSketch(Plane(origin=(109.22, 0, 0), x_dir=(0, -1, 0), z_dir=(-1, 0, 0))):
        with Locations((0, 9.525)):
            Rectangle(F31_W, F31_H)
    extrude(amount=-F32_DEPTH, mode=Mode.SUBTRACT)


solid = f1.part
